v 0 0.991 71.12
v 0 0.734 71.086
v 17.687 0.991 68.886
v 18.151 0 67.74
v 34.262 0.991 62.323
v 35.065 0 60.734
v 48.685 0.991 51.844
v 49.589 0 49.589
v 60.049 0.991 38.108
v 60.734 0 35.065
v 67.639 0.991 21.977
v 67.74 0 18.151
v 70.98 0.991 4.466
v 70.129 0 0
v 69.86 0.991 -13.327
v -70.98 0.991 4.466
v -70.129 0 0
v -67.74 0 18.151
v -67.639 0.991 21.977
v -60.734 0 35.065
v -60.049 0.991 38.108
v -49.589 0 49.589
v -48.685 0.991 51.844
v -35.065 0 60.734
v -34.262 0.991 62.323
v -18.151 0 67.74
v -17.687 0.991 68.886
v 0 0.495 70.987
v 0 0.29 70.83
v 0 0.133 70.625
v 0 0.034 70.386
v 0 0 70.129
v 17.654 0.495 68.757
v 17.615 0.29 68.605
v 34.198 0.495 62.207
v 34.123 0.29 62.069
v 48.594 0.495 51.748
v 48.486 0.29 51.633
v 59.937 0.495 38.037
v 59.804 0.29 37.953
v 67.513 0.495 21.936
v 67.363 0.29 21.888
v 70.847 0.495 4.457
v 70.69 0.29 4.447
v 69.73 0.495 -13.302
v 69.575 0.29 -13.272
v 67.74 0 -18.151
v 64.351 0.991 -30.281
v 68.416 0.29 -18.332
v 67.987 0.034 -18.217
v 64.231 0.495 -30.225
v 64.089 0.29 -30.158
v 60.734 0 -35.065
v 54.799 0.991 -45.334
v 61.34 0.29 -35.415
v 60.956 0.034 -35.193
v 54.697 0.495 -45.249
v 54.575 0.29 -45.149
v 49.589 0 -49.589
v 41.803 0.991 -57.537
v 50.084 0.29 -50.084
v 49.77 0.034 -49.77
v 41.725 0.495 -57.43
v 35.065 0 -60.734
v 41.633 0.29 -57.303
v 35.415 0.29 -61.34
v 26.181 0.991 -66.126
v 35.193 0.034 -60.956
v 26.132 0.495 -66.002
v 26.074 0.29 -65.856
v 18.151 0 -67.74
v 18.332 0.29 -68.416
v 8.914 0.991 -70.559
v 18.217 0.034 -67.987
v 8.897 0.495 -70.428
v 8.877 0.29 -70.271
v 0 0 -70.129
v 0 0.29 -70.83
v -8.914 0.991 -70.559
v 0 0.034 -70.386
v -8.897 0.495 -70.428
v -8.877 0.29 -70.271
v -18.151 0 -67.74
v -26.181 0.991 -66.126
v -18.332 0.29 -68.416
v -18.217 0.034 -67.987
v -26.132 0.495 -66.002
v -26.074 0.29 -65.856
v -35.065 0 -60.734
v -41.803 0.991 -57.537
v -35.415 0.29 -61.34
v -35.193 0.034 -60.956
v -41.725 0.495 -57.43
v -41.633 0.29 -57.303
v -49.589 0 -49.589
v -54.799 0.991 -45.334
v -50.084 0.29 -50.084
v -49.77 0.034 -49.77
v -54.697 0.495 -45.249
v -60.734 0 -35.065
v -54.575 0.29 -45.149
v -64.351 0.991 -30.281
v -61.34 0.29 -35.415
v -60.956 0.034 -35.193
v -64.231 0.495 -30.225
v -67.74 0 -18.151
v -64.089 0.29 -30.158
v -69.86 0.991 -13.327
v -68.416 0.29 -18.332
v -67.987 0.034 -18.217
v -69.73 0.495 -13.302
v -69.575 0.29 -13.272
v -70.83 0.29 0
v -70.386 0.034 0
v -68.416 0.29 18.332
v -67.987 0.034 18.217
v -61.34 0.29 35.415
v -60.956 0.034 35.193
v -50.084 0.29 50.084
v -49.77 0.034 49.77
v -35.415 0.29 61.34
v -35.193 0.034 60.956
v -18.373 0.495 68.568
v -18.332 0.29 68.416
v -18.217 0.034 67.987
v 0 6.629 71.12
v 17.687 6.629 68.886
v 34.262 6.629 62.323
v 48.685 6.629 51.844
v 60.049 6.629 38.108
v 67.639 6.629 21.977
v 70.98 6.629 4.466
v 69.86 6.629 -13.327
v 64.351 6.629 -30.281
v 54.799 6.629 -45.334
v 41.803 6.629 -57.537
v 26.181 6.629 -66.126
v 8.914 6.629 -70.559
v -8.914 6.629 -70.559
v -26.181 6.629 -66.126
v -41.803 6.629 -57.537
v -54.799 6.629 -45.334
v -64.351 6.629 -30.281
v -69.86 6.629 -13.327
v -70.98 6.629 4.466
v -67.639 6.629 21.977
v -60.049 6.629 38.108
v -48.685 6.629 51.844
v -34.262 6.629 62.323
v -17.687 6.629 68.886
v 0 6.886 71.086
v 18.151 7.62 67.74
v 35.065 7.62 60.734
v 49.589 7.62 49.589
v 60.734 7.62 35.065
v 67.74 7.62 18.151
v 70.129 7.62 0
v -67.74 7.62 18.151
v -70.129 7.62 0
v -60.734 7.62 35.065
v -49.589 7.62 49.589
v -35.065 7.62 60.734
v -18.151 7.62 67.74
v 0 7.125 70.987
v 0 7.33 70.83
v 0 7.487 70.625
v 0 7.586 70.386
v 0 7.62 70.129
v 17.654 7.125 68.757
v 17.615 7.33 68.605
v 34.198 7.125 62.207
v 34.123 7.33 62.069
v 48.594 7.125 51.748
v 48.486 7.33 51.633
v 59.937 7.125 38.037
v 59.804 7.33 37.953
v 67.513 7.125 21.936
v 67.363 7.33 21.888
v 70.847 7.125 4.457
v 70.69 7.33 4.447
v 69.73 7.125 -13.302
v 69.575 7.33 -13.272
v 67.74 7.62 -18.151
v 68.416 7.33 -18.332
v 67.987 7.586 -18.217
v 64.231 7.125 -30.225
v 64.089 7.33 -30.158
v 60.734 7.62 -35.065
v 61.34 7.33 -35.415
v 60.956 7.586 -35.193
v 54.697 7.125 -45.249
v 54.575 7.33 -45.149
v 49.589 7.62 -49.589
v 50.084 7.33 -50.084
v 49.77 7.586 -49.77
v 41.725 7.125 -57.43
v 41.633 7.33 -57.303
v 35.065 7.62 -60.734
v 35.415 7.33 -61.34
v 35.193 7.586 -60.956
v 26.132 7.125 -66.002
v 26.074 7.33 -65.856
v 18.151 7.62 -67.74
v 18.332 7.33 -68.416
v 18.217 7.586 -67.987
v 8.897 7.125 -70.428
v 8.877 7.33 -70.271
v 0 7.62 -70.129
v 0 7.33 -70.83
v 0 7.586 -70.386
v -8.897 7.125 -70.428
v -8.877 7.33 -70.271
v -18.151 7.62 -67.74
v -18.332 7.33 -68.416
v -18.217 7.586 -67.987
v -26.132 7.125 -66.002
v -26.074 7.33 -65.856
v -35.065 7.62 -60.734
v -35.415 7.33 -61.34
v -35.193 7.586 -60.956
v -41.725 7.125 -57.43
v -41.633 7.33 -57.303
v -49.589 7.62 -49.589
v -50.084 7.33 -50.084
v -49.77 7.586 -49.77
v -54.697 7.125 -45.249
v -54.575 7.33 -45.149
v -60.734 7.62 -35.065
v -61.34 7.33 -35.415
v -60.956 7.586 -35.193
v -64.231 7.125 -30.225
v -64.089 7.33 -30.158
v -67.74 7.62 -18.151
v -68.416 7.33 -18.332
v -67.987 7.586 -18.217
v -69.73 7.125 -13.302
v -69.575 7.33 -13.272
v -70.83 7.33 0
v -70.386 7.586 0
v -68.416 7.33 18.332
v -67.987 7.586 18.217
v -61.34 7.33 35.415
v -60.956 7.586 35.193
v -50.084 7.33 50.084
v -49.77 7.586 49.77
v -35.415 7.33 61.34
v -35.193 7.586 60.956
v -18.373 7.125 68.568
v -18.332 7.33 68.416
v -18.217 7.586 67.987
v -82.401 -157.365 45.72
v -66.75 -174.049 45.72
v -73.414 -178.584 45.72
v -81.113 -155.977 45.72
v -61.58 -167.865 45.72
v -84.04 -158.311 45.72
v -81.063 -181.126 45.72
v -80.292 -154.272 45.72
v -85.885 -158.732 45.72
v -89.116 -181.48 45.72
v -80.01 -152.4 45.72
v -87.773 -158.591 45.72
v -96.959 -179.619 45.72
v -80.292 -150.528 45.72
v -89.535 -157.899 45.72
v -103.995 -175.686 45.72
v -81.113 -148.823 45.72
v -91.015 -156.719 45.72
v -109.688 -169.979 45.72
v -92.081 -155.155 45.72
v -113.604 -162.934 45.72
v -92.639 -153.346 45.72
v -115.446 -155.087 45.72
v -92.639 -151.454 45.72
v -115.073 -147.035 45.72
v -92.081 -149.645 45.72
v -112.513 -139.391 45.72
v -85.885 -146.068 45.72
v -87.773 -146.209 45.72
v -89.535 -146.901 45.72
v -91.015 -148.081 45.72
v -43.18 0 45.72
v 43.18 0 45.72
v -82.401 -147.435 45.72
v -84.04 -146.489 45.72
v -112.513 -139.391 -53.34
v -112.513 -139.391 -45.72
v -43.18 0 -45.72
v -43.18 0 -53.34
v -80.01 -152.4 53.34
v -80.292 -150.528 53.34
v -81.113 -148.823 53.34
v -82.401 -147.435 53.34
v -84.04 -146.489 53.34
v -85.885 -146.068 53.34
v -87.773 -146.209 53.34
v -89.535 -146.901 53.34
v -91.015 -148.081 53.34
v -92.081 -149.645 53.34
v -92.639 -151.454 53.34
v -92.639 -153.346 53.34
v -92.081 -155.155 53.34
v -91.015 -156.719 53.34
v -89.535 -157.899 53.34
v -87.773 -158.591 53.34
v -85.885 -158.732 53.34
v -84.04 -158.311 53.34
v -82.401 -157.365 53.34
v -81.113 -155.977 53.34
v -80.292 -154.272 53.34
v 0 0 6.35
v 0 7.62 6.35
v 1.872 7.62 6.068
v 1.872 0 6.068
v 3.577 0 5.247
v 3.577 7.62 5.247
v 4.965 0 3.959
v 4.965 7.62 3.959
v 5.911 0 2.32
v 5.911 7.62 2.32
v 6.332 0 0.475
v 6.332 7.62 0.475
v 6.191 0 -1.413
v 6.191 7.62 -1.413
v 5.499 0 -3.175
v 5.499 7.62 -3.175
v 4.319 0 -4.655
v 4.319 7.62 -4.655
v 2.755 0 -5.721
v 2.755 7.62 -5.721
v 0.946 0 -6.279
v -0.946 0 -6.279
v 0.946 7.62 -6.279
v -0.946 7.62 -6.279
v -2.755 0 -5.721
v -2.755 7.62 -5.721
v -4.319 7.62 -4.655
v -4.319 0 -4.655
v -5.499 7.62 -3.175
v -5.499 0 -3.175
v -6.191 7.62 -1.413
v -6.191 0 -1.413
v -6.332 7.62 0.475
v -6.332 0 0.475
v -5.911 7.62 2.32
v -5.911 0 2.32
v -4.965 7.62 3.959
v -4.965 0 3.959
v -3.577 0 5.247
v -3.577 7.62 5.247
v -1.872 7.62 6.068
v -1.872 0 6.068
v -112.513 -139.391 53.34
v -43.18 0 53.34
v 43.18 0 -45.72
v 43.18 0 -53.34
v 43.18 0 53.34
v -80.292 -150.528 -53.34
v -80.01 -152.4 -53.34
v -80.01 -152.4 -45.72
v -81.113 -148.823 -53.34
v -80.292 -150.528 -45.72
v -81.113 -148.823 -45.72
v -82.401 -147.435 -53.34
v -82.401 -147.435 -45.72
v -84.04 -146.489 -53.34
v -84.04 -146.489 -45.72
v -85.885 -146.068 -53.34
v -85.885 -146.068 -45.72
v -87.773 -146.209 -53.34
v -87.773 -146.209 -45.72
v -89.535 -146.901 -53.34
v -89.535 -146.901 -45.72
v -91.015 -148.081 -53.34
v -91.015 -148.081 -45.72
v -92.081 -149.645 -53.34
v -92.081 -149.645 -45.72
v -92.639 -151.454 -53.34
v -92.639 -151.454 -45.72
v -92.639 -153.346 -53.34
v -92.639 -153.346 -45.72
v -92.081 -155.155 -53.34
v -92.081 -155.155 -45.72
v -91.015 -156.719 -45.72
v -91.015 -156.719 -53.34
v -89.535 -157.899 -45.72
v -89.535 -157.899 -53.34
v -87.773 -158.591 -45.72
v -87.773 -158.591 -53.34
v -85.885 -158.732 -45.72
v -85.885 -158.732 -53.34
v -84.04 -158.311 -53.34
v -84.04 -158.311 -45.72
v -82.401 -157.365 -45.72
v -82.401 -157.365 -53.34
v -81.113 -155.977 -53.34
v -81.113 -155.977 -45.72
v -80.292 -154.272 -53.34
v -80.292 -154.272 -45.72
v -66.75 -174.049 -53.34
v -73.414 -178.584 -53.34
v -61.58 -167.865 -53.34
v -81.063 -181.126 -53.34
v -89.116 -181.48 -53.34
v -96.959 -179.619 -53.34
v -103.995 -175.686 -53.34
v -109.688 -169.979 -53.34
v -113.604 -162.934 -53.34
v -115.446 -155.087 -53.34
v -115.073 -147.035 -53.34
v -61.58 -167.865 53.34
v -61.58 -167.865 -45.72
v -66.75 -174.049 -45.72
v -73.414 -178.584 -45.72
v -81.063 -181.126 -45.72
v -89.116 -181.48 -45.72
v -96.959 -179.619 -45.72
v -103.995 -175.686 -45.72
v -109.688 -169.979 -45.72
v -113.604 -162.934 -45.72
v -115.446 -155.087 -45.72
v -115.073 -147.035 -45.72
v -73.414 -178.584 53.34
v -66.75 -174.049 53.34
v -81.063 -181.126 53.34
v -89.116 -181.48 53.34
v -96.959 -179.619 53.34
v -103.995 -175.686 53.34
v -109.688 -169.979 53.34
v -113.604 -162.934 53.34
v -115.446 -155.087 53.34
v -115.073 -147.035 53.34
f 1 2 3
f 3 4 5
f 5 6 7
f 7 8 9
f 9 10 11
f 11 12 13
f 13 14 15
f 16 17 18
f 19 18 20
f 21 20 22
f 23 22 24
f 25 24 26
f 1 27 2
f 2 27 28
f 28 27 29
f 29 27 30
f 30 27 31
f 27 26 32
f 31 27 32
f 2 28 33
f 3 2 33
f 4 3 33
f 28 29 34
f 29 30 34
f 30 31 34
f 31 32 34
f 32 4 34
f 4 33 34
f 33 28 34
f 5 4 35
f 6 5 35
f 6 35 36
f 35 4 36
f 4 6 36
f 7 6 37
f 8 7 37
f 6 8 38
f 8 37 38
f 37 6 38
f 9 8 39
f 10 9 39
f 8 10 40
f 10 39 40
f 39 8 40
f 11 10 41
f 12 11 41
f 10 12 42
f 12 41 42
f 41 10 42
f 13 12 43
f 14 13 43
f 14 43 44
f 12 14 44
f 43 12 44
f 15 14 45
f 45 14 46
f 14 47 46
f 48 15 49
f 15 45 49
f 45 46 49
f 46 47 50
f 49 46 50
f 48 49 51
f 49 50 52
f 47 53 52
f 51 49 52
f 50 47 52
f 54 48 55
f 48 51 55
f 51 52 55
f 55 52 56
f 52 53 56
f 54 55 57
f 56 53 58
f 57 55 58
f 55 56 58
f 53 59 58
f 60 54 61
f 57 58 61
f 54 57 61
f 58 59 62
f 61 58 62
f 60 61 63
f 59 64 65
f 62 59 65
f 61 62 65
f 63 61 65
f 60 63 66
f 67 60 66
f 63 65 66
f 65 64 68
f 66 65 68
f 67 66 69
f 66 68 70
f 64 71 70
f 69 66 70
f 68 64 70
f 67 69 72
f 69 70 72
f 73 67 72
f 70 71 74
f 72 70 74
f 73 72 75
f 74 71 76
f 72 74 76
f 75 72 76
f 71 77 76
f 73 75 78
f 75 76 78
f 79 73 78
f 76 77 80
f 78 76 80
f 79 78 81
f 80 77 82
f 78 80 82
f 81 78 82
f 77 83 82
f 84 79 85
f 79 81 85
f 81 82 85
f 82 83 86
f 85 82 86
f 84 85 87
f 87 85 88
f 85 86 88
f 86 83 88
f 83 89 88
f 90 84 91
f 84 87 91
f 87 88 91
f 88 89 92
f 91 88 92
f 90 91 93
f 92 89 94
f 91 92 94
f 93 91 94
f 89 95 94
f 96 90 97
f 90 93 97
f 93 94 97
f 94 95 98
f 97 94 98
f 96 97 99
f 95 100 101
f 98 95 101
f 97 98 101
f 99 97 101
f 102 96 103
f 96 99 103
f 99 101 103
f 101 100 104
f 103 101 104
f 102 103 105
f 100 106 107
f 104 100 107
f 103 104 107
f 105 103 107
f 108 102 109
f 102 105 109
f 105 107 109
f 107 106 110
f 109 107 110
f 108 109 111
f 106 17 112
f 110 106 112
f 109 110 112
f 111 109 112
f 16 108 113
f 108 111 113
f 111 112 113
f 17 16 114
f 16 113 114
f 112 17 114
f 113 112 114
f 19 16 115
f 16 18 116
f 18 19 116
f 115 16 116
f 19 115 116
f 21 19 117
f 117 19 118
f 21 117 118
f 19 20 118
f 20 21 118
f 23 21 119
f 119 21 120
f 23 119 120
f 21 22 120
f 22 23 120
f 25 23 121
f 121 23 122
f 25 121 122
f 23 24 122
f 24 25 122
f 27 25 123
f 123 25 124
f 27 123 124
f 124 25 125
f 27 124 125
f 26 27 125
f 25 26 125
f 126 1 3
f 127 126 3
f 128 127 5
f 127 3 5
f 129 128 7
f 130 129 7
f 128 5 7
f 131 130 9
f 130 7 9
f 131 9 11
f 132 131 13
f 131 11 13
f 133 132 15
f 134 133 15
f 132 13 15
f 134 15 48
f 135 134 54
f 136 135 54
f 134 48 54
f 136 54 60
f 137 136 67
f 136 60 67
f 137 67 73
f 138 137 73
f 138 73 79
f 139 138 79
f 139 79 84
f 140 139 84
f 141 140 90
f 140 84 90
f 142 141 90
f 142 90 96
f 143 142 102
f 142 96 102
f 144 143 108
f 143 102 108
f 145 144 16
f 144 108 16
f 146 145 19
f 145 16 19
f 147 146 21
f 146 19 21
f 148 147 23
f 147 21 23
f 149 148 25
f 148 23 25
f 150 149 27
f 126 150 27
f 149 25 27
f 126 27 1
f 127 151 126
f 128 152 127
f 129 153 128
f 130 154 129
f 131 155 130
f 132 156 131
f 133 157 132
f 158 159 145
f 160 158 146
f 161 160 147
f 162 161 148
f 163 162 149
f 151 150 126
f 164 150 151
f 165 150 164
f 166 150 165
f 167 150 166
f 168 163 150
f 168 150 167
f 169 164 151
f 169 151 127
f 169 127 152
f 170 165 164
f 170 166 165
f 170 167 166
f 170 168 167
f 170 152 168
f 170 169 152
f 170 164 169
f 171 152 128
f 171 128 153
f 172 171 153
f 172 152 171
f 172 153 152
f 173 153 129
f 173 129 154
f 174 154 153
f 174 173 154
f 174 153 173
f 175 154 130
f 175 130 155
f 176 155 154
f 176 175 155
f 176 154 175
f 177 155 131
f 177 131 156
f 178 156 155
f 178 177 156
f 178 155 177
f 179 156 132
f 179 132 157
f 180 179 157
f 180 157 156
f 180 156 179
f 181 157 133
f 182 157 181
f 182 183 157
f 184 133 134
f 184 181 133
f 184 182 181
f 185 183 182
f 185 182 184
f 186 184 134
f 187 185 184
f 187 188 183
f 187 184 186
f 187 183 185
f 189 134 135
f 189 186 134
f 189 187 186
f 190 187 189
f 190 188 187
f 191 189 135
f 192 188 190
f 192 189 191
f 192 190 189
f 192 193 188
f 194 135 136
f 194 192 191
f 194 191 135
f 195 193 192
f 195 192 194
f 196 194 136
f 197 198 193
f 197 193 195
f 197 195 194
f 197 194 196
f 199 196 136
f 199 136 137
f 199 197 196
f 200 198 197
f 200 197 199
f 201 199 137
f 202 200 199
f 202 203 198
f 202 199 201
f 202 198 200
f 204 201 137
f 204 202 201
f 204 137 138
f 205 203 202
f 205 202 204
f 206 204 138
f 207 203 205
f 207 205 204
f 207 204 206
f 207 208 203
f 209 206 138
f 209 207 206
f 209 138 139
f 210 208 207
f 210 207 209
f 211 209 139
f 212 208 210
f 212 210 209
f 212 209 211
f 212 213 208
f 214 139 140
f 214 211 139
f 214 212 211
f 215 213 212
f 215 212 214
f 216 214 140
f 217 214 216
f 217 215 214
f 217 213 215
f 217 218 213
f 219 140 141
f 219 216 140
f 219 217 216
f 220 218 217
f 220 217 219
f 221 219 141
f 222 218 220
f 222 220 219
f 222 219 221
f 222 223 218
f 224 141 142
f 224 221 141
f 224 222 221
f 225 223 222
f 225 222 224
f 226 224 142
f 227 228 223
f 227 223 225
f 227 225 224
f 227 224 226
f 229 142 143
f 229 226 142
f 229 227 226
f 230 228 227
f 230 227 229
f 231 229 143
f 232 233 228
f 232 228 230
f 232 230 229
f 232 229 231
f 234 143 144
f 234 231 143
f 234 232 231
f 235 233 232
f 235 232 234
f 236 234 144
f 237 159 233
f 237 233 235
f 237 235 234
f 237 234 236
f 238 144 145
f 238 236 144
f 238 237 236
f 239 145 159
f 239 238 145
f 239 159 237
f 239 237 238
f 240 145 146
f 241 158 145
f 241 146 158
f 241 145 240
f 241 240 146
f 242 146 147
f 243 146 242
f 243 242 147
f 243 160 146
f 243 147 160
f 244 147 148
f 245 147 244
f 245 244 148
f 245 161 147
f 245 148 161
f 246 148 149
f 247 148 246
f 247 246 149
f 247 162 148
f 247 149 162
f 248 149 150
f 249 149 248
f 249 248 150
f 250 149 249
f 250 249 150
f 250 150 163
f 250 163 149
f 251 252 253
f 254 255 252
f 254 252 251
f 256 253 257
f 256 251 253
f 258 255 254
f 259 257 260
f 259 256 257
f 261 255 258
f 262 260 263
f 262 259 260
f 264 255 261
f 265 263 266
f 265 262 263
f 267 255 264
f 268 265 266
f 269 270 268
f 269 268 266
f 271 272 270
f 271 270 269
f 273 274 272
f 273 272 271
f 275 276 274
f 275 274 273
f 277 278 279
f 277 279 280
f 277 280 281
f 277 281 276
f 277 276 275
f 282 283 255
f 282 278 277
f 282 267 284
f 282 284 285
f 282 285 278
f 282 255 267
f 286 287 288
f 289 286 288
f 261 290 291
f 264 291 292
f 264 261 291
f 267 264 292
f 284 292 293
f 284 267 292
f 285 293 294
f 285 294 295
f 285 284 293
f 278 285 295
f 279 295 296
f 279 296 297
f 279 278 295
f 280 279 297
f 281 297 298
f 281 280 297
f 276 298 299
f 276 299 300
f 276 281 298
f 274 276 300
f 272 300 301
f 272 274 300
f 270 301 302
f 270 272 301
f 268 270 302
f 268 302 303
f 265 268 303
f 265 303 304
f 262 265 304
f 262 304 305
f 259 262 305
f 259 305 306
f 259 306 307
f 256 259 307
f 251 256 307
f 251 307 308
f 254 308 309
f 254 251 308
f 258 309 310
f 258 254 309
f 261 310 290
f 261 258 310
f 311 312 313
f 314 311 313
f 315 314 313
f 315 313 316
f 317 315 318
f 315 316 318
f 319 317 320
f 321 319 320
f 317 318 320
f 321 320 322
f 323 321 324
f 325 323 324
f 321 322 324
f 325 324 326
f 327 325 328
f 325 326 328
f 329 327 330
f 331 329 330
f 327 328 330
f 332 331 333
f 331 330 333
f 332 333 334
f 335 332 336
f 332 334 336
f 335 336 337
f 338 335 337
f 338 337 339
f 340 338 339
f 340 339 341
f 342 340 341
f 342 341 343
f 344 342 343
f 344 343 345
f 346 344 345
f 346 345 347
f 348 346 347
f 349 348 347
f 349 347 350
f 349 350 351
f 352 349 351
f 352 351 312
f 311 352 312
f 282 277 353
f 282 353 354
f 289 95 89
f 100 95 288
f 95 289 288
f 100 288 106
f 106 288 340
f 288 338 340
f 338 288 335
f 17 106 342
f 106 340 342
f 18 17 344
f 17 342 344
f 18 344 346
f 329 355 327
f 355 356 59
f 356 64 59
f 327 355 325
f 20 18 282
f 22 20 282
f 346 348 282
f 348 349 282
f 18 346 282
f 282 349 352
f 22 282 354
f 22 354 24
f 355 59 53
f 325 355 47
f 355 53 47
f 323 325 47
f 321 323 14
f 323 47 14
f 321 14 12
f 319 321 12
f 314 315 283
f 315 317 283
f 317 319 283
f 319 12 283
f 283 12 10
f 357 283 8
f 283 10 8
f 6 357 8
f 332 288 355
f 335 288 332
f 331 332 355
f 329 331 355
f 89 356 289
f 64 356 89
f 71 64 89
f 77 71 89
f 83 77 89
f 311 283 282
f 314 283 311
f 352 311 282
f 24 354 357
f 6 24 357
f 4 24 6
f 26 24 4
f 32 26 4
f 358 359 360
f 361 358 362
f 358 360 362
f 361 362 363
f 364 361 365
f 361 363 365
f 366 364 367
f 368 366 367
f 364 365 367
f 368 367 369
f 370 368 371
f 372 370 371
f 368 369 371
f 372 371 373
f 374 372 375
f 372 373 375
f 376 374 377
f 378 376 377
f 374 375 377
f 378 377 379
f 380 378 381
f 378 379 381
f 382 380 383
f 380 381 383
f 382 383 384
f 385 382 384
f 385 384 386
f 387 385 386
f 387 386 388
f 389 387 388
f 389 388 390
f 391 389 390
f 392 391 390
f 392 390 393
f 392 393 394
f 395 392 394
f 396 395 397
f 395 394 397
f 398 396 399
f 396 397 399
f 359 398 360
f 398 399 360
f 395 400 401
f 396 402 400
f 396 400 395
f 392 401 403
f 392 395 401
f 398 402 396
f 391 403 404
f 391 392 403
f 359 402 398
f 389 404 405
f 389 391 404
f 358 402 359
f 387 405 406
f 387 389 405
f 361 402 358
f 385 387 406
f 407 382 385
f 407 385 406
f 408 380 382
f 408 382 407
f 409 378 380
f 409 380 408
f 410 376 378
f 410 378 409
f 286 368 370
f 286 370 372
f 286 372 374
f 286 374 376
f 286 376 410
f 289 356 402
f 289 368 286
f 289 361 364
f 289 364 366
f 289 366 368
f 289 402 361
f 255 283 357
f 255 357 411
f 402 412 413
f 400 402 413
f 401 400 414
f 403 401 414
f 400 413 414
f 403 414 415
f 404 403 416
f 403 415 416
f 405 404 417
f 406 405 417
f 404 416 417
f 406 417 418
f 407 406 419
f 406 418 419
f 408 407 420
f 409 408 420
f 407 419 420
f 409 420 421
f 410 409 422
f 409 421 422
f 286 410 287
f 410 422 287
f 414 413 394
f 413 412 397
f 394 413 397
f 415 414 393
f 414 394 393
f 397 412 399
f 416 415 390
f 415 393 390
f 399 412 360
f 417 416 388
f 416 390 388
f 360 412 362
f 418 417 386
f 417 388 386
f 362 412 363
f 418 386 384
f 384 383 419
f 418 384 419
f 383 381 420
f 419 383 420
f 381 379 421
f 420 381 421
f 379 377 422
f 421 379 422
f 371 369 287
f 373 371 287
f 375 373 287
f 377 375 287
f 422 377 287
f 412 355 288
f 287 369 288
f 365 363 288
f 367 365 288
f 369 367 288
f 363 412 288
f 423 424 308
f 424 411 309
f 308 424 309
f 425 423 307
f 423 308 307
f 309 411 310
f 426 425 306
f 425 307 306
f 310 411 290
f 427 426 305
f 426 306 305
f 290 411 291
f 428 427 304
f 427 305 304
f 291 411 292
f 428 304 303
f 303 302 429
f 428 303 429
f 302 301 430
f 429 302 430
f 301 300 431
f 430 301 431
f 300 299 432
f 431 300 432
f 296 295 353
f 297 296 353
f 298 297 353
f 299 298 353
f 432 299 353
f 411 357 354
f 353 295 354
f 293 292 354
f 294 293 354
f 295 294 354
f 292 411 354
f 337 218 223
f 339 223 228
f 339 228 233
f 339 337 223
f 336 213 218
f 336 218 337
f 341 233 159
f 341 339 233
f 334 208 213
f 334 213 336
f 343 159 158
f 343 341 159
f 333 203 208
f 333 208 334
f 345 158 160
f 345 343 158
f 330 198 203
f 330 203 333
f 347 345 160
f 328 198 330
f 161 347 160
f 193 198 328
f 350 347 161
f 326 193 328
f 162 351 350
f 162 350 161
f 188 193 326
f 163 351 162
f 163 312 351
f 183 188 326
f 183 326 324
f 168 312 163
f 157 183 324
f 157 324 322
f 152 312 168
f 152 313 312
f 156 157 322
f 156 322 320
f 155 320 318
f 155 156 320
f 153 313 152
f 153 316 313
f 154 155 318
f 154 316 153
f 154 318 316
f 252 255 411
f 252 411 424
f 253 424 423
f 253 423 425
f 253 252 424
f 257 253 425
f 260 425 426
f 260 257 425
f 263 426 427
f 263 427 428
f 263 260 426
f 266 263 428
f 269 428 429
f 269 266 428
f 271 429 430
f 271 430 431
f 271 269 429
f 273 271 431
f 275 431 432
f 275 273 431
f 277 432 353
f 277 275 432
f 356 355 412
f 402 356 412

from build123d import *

# Parameters (mm, degrees)
SKETCH1_R           = 71.12
BOSS_EXTRUDE1_DEPTH = 7.62
FILLET1_R           = 0.9906
SKETCH3_R           = 6.35
BOSS_EXTRUDE2_DEPTH = 7.62
SKETCH5_R           = 6.35
CUT_EXTRUDE1_DEPTH  = 233.857192717


with BuildPart() as part:
    # Sketch1 → Boss-Extrude1 (new body)
    with BuildSketch(Plane(origin=(0, 0, 0), x_dir=(1, 0, 0), z_dir=(0, 1, 0))):
        with Locations(Location((0, 0, 0), (0, 0, 270))):
            Circle(SKETCH1_R)
    extrude(amount=BOSS_EXTRUDE1_DEPTH)

    # Fillet1
    fillet1_edges = [part.edges().sort_by_distance(p)[0] for p in [
        (0, 0, -71.12),
        (0, 7.62, -71.12),
    ]]
    fillet(fillet1_edges, radius=FILLET1_R)

    # Sketch3 → Boss-Extrude2 (add)
    with BuildSketch(Plane.XY.offset(45.72)):
        with BuildLine():
            Line((0, 0), (43.18, 0))
            Line((43.18, 0), (-61.579637217, -167.864725032))
            ThreePointArc((-61.579637217, -167.864725032), (-100.613254195, -177.896447691), (-112.513352174, -139.391300217))
            Line((-112.513352174, -139.391300217), (-43.18, 0))
            Line((-43.18, 0), (0, 0))
        make_face()
        with Locations((-86.36, -152.4)):
            Circle(SKETCH3_R, mode=Mode.SUBTRACT)
    boss_extrude2 = extrude(amount=BOSS_EXTRUDE2_DEPTH)

    # Mirror1: Boss-Extrude2 across plane
    add(boss_extrude2.mirror(Plane.XY))

    # Sketch5 → Cut-Extrude1 (cut, through all)
    with BuildSketch(Plane(origin=(0, 7.62, 0), x_dir=(1, 0, 0), z_dir=(0, 1, 0))):
        with Locations(Location((0, 0, 0), (0, 0, 270))):
            Circle(SKETCH5_R)
    extrude(amount=-CUT_EXTRUDE1_DEPTH, mode=Mode.SUBTRACT)


solid = part.part
